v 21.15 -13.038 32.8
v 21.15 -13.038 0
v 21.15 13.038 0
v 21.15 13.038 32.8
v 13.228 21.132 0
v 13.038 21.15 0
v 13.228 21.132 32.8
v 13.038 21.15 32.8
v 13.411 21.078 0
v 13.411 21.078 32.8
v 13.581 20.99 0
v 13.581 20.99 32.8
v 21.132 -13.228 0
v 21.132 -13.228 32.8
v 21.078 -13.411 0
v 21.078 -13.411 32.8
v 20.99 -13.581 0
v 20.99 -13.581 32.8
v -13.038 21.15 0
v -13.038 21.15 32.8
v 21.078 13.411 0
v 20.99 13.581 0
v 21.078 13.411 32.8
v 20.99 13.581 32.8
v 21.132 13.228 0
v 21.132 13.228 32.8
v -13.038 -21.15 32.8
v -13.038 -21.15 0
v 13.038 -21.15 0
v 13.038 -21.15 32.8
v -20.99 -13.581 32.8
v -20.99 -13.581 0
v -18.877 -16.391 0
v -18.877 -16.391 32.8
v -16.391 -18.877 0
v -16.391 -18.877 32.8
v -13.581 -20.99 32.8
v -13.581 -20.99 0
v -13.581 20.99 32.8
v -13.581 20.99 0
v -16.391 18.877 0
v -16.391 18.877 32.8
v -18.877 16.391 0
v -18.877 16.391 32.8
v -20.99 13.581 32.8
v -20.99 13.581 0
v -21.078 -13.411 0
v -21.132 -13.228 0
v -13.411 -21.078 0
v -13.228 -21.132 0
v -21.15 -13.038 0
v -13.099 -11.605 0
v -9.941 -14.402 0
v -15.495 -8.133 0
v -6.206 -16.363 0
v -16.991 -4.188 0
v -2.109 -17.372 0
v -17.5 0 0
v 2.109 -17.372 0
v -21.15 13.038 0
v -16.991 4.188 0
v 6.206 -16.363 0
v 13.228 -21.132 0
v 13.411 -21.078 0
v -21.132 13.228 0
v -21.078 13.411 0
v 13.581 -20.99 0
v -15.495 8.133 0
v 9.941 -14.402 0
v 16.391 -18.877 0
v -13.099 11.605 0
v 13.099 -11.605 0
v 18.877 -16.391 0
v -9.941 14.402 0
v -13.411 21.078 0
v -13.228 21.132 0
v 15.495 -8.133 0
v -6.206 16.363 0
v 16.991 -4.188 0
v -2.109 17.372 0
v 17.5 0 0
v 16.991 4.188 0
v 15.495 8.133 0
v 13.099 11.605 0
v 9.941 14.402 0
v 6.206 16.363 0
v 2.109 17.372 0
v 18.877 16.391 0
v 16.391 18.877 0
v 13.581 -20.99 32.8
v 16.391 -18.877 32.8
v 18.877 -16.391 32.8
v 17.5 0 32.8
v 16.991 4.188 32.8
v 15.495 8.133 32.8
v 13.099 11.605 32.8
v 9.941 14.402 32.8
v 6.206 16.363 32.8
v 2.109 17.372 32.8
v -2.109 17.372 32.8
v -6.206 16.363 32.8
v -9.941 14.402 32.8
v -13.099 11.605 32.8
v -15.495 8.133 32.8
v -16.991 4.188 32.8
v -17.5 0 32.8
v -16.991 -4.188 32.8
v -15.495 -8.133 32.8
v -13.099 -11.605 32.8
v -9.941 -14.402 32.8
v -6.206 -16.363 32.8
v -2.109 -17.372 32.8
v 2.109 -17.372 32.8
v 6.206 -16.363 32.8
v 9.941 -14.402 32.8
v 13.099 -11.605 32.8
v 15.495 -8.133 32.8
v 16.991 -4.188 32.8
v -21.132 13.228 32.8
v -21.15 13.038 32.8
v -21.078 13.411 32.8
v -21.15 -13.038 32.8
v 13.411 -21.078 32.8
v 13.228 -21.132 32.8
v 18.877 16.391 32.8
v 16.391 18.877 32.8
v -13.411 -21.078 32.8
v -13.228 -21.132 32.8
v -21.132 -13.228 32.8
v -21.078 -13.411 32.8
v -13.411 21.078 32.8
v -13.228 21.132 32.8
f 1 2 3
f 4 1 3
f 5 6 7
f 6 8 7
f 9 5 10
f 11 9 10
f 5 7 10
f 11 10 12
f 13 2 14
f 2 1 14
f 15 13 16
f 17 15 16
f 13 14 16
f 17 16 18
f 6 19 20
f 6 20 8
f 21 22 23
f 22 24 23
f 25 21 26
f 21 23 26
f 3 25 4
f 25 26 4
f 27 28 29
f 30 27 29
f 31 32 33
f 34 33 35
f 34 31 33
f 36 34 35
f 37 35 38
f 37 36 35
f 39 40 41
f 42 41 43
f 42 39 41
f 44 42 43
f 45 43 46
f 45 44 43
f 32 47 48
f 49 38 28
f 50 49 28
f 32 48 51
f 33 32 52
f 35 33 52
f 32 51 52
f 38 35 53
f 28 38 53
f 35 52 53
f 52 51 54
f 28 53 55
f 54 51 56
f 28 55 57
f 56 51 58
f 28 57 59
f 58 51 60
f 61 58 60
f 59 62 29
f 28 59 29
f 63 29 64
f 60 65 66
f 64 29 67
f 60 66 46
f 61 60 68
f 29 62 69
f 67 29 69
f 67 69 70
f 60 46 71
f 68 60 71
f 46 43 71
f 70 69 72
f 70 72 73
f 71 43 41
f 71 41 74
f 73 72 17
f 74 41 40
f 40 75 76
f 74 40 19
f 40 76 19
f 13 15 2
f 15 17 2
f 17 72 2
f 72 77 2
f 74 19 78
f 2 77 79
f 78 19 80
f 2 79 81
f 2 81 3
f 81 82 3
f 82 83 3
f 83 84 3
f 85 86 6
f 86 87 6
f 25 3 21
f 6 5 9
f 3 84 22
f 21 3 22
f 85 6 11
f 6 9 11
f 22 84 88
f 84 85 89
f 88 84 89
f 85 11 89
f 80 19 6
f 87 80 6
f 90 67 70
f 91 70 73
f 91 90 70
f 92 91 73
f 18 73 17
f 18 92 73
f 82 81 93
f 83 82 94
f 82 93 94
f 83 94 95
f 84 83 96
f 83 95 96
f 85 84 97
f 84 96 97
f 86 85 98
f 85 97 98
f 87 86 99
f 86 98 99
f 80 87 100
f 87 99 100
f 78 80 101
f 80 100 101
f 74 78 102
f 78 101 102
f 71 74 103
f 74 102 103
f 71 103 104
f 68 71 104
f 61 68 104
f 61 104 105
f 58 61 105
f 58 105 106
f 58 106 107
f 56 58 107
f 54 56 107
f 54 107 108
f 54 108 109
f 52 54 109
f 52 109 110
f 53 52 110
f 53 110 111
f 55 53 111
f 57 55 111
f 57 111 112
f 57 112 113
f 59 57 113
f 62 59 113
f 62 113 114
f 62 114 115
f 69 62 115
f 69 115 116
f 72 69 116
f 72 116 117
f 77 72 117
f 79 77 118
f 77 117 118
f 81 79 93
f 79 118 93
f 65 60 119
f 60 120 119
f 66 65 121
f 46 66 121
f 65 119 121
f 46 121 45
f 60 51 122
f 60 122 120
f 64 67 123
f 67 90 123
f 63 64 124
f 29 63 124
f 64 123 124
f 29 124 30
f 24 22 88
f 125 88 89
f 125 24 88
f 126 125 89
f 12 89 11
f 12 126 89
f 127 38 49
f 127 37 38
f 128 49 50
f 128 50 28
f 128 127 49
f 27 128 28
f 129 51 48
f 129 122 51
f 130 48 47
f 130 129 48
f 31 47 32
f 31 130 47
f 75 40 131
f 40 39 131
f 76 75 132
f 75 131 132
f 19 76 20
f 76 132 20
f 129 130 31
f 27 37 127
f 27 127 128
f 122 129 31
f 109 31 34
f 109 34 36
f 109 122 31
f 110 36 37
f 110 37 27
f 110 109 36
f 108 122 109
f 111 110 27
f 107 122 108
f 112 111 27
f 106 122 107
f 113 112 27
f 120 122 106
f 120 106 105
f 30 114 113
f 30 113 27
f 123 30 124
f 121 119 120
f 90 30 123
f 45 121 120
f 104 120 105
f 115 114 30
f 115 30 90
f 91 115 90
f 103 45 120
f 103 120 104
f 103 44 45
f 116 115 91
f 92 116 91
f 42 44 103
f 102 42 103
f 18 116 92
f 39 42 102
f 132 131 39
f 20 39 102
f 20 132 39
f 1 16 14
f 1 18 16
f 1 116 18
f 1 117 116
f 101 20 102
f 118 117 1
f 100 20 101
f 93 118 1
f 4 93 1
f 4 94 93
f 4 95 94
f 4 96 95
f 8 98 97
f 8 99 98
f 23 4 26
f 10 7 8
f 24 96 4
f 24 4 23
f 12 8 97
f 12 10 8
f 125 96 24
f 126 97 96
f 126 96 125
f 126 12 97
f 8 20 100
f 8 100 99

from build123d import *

# Parameters (mm, degrees)
CROQUIS1_W              = 42.3
CROQUIS1_H              = 42.3
SALIENTE_EXTRUIR1_DEPTH = 32.8
SKETCH1_R               = 29.910616844
SKETCH1_R_2             = 25
CUT_EXTRUDE1_DEPTH      = 33.8
FILLET1_R               = 1
SKETCH2_R               = 17.5
CUT_EXTRUDE2_DEPTH      = 33.8


with BuildPart() as part:
    # Croquis1 → Saliente-Extruir1 (new body)
    with BuildSketch(Plane.XY):
        Rectangle(CROQUIS1_W, CROQUIS1_H)
    extrude(amount=SALIENTE_EXTRUIR1_DEPTH)

    # Sketch1 → Cut-Extrude1 (cut, through all)
    with BuildSketch(Plane.XY.offset(32.8)):
        Circle(SKETCH1_R)
        Circle(SKETCH1_R_2, mode=Mode.SUBTRACT)
    extrude(amount=-CUT_EXTRUDE1_DEPTH, mode=Mode.SUBTRACT)

    # Fillet1
    fillet1_edges = [part.edges().sort_by_distance(p)[0] for p in [
        (21.15, -13.329572386, 16.4),
        (21.15, 13.329572386, 16.4),
        (13.329572386, 21.15, 16.4),
        (-13.329572386, 21.15, 16.4),
        (-21.15, 13.329572386, 16.4),
        (-21.15, -13.329572386, 16.4),
        (-13.329572386, -21.15, 16.4),
        (13.329572386, -21.15, 16.4),
    ]]
    fillet(fillet1_edges, radius=FILLET1_R)

    # Sketch2 → Cut-Extrude2 (cut, through all)
    with BuildSketch(Plane.XY.offset(32.8)):
        Circle(SKETCH2_R)
    extrude(amount=-CUT_EXTRUDE2_DEPTH, mode=Mode.SUBTRACT)


solid = part.part
